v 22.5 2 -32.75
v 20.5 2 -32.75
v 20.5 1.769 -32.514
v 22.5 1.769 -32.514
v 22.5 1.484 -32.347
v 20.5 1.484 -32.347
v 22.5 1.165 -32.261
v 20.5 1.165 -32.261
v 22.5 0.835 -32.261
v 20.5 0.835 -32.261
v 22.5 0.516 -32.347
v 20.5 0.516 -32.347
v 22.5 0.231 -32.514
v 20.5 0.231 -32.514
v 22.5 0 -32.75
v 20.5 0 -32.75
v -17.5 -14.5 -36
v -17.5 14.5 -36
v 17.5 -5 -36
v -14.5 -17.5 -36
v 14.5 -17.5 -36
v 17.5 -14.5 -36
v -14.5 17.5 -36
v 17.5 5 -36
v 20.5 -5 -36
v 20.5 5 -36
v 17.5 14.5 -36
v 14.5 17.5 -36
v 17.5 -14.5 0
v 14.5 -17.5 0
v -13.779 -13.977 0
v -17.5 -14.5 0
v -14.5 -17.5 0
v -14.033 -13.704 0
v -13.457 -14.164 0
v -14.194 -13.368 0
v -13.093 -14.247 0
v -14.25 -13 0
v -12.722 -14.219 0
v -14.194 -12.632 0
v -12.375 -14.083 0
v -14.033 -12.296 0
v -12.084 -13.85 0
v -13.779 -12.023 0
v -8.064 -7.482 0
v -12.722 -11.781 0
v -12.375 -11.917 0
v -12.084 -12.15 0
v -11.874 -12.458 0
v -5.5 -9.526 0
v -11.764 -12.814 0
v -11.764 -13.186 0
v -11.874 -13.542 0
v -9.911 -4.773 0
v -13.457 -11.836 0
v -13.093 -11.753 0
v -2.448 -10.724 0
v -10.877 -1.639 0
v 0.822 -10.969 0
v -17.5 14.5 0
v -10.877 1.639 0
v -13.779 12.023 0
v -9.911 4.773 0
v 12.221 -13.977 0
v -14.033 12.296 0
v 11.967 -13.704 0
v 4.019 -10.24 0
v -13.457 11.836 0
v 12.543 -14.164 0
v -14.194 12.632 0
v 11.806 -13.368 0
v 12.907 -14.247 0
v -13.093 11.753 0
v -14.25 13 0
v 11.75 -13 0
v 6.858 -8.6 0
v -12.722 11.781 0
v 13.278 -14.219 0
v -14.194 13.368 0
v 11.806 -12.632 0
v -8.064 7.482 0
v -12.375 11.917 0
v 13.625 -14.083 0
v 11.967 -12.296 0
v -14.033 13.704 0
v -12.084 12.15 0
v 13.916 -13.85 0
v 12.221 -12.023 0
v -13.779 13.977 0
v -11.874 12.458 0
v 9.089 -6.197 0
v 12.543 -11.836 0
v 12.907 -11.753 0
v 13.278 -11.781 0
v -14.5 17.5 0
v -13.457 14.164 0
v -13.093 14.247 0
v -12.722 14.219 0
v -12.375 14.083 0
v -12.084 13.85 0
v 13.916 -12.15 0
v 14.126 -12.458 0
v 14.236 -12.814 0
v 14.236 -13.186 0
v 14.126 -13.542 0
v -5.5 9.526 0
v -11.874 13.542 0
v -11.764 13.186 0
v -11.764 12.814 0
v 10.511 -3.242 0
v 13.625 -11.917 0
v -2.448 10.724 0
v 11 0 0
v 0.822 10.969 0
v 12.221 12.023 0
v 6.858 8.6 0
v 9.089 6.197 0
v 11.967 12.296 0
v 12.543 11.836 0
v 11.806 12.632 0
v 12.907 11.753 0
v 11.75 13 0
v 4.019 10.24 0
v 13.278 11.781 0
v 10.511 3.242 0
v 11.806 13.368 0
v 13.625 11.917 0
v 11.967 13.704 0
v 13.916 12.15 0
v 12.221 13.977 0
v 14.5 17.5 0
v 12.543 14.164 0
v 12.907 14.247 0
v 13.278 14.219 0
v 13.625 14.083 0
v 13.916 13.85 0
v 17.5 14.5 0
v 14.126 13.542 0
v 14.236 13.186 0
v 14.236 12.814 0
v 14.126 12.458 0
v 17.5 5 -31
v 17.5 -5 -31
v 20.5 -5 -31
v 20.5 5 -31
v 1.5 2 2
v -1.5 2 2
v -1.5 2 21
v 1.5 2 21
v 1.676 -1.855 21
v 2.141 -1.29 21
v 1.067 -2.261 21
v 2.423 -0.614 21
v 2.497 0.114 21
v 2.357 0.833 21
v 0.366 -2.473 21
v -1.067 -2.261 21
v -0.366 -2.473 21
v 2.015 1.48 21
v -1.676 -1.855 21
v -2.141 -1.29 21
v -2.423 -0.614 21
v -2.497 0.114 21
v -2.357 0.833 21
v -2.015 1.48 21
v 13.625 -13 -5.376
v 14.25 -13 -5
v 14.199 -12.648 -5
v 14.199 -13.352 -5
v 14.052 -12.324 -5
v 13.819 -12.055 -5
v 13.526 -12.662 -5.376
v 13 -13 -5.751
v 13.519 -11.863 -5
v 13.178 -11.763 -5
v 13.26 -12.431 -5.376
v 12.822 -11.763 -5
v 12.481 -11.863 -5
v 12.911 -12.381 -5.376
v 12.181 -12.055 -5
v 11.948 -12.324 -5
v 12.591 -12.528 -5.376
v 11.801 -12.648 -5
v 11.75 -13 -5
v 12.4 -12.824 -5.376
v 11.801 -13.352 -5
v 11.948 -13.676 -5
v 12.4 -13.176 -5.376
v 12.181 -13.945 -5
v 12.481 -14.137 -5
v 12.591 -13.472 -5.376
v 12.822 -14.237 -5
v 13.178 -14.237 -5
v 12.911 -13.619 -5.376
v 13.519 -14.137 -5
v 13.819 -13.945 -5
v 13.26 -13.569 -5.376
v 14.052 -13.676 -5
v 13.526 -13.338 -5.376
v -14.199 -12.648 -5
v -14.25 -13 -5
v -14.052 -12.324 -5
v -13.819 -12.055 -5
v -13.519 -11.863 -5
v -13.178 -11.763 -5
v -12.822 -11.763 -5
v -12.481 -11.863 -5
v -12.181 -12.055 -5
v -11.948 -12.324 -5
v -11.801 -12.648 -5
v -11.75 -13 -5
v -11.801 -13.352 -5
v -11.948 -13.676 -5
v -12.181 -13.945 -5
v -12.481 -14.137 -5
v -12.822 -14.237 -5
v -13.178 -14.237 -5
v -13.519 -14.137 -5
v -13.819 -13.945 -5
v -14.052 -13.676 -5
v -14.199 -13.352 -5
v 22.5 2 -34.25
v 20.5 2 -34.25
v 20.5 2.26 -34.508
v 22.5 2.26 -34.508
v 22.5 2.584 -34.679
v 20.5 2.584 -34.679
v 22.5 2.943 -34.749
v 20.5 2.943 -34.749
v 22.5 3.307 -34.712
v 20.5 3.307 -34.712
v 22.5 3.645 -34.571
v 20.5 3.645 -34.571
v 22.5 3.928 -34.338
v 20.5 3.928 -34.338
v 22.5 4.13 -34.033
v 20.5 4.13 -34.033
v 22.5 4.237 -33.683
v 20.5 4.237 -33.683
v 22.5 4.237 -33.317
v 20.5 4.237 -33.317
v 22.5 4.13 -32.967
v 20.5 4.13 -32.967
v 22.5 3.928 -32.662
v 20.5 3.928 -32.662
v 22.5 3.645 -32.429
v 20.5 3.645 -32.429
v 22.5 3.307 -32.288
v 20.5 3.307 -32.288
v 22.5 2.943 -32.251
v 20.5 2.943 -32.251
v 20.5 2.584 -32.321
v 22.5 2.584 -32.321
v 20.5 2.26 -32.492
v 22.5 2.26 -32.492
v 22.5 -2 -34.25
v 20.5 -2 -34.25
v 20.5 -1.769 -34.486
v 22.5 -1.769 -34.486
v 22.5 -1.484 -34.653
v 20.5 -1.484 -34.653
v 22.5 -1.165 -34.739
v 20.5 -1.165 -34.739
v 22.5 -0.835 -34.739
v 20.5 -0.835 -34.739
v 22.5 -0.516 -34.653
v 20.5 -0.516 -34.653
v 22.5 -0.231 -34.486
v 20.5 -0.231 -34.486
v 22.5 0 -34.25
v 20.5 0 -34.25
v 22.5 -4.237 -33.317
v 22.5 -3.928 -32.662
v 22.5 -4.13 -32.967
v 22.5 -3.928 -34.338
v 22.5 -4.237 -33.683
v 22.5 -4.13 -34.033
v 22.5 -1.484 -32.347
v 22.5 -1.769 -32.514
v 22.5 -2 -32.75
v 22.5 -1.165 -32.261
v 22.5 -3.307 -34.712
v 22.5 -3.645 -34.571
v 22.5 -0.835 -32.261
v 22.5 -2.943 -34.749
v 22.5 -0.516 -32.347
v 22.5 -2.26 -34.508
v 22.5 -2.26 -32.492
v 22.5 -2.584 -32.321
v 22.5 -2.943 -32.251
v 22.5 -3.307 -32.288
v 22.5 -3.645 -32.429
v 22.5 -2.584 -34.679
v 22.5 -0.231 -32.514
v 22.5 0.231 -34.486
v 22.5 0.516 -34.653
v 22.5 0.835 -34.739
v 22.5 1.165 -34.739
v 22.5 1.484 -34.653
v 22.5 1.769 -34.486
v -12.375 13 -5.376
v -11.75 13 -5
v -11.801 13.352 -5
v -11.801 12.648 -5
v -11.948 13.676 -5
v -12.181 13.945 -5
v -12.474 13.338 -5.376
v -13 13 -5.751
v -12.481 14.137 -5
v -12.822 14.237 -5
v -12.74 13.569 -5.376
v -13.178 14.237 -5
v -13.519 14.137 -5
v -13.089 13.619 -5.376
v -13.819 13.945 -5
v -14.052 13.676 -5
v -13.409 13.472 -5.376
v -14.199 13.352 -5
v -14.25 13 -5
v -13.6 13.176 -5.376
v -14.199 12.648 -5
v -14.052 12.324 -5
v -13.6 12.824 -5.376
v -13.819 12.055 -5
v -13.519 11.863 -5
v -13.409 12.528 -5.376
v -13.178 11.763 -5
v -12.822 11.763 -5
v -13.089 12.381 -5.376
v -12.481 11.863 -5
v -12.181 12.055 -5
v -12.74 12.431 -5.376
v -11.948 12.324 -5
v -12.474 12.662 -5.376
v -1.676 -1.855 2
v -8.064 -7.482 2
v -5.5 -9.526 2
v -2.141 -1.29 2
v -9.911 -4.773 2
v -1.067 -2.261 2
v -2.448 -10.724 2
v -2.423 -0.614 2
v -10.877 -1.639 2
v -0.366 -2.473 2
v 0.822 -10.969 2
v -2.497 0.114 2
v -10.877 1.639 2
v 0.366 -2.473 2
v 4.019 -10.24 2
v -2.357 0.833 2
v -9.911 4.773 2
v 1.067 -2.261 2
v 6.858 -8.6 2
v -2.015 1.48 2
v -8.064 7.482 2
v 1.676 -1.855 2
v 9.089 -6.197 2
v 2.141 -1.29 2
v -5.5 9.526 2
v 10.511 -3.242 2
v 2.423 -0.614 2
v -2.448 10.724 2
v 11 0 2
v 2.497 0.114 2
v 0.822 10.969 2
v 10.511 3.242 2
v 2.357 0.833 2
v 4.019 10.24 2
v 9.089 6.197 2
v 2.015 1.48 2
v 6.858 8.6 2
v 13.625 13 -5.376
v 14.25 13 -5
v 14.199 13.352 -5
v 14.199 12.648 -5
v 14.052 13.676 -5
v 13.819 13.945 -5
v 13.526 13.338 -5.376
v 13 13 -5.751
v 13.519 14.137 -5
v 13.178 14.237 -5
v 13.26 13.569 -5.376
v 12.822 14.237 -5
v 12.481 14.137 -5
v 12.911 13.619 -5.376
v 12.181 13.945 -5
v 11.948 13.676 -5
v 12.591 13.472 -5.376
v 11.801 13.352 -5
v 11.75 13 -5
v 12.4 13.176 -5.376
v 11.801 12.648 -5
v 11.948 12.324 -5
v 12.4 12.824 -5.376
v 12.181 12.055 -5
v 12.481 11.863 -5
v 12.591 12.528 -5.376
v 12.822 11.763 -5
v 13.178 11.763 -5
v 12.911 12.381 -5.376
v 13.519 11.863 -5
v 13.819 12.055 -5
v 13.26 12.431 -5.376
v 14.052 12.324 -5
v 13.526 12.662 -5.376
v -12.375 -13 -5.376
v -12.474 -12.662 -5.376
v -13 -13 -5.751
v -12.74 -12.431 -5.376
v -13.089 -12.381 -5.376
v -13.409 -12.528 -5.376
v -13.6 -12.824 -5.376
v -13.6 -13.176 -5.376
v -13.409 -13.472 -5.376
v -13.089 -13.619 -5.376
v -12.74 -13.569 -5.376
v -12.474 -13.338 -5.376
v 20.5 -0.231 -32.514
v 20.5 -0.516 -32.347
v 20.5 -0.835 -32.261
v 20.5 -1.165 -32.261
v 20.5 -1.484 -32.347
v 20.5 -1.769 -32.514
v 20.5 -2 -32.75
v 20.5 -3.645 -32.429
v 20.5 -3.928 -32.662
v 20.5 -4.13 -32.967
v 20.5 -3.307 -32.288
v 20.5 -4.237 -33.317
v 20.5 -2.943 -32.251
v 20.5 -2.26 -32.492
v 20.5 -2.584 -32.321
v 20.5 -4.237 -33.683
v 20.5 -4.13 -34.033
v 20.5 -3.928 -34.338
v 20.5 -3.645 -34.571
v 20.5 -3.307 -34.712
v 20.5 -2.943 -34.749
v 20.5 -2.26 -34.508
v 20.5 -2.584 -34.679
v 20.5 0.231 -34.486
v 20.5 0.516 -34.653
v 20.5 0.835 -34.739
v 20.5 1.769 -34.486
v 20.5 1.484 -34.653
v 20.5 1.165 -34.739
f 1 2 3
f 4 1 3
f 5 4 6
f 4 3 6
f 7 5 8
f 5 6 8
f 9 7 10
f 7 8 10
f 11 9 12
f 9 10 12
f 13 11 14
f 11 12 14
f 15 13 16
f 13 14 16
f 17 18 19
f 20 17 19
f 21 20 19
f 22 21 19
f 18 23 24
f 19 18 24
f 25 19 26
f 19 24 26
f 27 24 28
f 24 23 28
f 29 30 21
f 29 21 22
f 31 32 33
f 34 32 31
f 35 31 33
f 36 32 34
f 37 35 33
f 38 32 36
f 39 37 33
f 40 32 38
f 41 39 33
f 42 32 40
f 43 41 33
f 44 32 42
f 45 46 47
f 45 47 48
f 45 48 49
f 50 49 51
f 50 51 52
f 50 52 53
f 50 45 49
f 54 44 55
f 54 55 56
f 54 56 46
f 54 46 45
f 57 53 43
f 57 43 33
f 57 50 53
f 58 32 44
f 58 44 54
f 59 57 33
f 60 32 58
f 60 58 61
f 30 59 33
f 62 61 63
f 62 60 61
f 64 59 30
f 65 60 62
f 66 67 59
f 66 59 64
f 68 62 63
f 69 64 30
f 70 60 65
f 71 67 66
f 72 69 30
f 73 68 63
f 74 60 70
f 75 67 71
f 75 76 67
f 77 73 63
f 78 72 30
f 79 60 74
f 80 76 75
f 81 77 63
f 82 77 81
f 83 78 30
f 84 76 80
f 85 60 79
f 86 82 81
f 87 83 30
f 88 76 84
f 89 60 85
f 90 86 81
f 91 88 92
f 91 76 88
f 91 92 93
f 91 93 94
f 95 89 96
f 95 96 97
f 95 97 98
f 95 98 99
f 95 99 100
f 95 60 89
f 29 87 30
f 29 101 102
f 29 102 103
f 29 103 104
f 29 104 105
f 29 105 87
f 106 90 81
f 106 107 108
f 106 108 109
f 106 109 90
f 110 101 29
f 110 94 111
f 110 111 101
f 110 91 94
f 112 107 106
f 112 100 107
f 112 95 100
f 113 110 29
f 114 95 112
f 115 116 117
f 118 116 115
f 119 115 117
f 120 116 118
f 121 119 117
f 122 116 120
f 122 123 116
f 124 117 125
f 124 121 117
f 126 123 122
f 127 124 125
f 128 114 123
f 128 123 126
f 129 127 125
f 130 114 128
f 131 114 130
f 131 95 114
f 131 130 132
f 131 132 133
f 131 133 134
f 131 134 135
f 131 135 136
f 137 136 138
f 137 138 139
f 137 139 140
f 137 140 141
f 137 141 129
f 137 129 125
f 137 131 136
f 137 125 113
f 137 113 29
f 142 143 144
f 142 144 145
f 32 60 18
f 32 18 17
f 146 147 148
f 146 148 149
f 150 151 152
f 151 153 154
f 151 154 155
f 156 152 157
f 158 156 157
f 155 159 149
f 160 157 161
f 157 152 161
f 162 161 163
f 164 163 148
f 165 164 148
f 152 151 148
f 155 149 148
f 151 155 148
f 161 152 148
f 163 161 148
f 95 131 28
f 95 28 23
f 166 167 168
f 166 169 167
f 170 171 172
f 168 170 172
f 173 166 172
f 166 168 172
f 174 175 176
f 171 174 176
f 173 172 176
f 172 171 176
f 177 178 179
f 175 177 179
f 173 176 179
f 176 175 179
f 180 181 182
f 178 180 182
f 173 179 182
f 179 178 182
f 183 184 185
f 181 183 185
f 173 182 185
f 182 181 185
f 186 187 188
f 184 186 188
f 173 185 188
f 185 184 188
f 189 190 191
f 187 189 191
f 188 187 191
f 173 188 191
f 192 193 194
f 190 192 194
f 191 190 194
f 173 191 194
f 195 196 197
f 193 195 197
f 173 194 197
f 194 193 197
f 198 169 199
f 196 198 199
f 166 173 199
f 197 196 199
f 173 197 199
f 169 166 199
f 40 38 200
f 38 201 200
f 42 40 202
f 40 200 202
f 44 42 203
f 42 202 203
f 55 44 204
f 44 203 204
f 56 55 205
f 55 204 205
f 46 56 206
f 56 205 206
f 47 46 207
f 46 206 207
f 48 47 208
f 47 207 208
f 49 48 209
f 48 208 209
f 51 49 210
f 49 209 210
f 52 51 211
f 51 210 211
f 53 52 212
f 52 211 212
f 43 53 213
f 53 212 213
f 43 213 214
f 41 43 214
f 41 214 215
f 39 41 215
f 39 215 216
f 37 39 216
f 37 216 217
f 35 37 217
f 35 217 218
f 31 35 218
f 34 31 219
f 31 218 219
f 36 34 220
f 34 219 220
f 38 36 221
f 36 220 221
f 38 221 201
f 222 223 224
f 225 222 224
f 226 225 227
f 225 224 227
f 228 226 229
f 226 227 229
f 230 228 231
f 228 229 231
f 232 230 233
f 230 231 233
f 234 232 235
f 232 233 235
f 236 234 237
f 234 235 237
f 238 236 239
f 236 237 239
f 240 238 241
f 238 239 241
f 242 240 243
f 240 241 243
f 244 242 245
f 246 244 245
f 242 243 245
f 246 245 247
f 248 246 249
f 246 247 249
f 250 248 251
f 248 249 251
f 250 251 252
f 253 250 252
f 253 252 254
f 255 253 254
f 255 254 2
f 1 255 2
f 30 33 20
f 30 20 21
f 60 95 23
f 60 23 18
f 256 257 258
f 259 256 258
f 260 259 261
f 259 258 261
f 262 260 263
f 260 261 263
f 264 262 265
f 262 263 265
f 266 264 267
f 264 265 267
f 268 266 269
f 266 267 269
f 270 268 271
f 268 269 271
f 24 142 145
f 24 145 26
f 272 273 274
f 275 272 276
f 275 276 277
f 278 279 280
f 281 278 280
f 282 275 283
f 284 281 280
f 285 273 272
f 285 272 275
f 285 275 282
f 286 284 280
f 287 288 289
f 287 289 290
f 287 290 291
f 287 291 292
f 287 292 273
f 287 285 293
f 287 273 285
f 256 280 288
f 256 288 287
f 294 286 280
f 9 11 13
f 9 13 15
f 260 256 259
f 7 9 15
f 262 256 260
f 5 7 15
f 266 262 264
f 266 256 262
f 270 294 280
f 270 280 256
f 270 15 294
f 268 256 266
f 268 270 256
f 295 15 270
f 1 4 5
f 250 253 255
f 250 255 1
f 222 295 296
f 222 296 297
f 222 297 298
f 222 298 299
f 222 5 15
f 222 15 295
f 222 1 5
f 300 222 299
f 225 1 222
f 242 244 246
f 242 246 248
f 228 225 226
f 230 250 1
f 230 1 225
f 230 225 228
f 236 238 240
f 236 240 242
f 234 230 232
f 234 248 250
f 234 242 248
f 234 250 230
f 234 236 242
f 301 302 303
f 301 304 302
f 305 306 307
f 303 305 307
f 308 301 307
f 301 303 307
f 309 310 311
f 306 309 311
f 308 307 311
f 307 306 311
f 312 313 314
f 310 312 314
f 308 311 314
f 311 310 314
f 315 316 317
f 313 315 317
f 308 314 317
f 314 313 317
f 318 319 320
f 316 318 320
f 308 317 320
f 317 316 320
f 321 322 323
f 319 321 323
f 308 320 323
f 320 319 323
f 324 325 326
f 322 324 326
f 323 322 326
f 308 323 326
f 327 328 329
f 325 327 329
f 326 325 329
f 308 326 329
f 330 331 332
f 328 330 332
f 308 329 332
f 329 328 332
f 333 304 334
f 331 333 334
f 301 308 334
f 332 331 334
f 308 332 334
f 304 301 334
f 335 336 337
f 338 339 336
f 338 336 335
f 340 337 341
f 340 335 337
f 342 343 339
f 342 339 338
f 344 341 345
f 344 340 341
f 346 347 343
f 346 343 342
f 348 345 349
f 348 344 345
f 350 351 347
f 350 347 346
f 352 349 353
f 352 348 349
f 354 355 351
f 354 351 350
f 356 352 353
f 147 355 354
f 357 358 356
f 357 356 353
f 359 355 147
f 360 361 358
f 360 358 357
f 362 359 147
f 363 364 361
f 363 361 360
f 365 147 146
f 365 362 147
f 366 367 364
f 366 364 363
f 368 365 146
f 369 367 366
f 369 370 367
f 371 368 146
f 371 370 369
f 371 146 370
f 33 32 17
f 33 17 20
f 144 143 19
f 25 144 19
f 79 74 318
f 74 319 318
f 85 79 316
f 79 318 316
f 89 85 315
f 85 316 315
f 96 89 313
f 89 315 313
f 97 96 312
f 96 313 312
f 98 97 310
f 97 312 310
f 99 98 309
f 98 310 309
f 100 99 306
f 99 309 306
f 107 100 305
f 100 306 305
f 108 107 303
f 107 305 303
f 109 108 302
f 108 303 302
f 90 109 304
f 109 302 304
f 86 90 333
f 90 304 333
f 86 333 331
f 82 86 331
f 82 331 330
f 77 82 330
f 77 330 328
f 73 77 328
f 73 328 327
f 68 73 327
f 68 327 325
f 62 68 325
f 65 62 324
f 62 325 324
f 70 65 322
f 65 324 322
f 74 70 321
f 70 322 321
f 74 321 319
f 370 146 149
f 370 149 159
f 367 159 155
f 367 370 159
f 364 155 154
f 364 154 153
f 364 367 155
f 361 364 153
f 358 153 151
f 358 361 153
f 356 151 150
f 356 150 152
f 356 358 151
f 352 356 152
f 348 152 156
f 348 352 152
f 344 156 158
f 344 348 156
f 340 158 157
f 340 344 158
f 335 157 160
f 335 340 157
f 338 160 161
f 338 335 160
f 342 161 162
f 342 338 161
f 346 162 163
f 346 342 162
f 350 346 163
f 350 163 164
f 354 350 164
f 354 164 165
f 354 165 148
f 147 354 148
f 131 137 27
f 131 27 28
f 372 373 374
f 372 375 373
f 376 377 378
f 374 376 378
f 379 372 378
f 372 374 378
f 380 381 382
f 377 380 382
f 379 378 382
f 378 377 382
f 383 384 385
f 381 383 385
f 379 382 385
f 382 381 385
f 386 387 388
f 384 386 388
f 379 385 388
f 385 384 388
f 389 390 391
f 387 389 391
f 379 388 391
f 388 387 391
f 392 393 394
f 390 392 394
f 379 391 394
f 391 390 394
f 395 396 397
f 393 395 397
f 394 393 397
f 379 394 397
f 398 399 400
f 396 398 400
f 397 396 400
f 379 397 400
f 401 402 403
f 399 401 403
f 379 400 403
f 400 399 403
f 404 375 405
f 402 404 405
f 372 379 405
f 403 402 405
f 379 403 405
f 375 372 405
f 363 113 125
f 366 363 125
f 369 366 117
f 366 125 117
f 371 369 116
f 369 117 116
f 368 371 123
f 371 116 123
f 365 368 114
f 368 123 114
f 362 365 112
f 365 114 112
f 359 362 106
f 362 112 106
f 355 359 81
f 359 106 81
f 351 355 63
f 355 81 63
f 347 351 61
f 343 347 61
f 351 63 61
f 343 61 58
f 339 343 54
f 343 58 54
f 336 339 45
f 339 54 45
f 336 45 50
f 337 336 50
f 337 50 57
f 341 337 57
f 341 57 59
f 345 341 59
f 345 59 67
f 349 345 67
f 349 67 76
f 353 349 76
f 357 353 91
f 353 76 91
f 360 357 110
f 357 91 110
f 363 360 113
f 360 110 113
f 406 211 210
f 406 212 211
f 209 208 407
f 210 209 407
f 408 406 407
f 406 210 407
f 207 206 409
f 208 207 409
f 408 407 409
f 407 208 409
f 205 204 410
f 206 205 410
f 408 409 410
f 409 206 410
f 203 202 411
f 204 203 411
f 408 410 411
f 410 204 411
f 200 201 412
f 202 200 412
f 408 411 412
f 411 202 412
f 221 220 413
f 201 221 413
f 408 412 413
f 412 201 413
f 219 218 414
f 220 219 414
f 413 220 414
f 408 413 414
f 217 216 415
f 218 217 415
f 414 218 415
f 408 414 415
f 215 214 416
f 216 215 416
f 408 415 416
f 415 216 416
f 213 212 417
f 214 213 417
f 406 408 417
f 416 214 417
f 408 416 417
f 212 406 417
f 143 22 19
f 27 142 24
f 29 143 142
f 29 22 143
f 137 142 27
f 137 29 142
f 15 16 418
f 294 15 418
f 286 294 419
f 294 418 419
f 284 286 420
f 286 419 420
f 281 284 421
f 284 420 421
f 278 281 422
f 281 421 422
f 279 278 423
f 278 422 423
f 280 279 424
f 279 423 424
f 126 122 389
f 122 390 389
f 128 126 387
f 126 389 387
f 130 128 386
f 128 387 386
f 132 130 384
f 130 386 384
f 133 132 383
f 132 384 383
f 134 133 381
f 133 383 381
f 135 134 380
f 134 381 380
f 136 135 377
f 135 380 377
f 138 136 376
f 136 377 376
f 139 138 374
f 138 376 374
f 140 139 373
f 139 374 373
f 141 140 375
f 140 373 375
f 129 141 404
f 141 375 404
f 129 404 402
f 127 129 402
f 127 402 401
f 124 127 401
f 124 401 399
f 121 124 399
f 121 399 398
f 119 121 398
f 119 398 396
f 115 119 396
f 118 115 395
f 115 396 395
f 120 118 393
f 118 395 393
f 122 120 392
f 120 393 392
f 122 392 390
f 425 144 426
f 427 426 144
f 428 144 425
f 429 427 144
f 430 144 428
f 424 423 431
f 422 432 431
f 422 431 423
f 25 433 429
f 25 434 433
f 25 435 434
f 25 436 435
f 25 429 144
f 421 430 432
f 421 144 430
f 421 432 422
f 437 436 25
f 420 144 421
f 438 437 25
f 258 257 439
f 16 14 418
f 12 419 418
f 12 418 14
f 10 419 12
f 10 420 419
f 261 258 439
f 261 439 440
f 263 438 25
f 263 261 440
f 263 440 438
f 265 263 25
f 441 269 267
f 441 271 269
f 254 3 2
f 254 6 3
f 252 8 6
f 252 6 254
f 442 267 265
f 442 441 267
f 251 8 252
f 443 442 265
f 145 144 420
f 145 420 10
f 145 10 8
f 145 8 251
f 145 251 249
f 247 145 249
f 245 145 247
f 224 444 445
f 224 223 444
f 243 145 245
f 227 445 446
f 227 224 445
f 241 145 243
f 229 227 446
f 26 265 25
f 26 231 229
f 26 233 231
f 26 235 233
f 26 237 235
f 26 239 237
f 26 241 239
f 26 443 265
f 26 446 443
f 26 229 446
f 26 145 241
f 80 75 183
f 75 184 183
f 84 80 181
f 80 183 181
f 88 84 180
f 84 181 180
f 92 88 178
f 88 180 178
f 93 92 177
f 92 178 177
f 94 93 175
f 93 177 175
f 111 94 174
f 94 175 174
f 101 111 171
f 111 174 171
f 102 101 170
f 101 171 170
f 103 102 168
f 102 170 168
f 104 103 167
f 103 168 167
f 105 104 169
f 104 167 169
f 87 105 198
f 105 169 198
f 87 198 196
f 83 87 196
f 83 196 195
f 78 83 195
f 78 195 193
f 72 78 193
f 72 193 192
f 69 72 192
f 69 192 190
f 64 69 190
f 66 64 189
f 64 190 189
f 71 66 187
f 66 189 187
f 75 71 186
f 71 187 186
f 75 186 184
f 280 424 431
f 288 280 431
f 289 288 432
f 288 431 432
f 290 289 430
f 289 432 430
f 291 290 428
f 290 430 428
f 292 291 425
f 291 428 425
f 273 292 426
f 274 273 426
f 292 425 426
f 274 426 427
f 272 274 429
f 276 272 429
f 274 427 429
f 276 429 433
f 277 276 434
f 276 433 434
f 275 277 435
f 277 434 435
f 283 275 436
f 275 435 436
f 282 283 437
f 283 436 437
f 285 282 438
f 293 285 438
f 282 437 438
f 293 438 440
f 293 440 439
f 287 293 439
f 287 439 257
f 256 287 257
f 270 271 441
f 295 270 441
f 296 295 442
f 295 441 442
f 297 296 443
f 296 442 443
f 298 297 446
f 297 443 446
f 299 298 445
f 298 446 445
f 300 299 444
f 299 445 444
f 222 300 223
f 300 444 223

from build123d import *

# Parameters (mm, degrees)
BOSS_EXTRUDE1_DEPTH       = 36
SKETCH1_3_R               = 11
BOSS_EXTRUDE2_DEPTH       = 2
M3X0_5_TAPPED_HOLE1_D     = 2.5
M3X0_5_TAPPED_HOLE1_DEPTH = 5
M3X0_5_TAPPED_HOLE1_TIP   = 0.751075774
BOSS_EXTRUDE3_DEPTH       = 21
SKETCH4_W                 = 5
SKETCH4_H                 = 10
BOSS_EXTRUDE4_DEPTH       = 3
BOSS_EXTRUDE5_START       = 3
SKETCH4_3_R               = 1.25
BOSS_EXTRUDE5_DEPTH       = 2


with BuildPart() as part:
    # Sketch1 → Boss-Extrude1 (new body)
    with BuildSketch(Plane.XY):
        Polygon((-14.5, 17.5), (-17.5, 14.5), (-17.5, -14.5), (-14.5, -17.5), (14.5, -17.5), (17.5, -14.5), (17.5, 14.5), (14.5, 17.5), align=None)
    extrude(amount=-BOSS_EXTRUDE1_DEPTH)

    # Sketch1<3> → Boss-Extrude2 (add)
    with BuildSketch(Plane.XY):
        Circle(SKETCH1_3_R)
    extrude(amount=BOSS_EXTRUDE2_DEPTH)

    # M3x0.5 Tapped Hole1
    with Locations(Plane.XY):
        with Locations((13, 13), (-13, 13), (-13, -13), (13, -13)):
            Hole(M3X0_5_TAPPED_HOLE1_D / 2, depth=M3X0_5_TAPPED_HOLE1_DEPTH)
            with Locations((0, 0, -(M3X0_5_TAPPED_HOLE1_DEPTH + M3X0_5_TAPPED_HOLE1_TIP / 2))):  # 118° drill point
                Cone(0, M3X0_5_TAPPED_HOLE1_D / 2, M3X0_5_TAPPED_HOLE1_TIP, mode=Mode.SUBTRACT)

    # Sketch1<4> → Boss-Extrude3 (add)
    with BuildSketch(Plane.XY):
        with BuildLine():
            Line((-1.5, 2), (1.5, 2))
            ThreePointArc((1.5, 2), (0, -2.5), (-1.5, 2))
        make_face()
    extrude(amount=BOSS_EXTRUDE3_DEPTH)

    # Sketch4 → Boss-Extrude4 (add)
    with BuildSketch(Plane(origin=(17.5, 0, 0), x_dir=(0, 0, -1), z_dir=(1, 0, 0))):
        with Locations((33.5, 0)):
            Rectangle(SKETCH4_W, SKETCH4_H)
    extrude(amount=BOSS_EXTRUDE4_DEPTH)

    # Sketch4<3> → Boss-Extrude5 (add)
    with BuildSketch(Plane(origin=(17.5, 0, 0), x_dir=(0, 0, -1), z_dir=(1, 0, 0)).offset(BOSS_EXTRUDE5_START)):
        with Locations((33.5, 3)):
            Circle(SKETCH4_3_R)
        with Locations((33.5, 1)):
            Circle(SKETCH4_3_R)
        with Locations((33.5, -1)):
            Circle(SKETCH4_3_R)
        with Locations((33.5, -3)):
            Circle(SKETCH4_3_R)
    extrude(amount=BOSS_EXTRUDE5_DEPTH)


solid = part.part
